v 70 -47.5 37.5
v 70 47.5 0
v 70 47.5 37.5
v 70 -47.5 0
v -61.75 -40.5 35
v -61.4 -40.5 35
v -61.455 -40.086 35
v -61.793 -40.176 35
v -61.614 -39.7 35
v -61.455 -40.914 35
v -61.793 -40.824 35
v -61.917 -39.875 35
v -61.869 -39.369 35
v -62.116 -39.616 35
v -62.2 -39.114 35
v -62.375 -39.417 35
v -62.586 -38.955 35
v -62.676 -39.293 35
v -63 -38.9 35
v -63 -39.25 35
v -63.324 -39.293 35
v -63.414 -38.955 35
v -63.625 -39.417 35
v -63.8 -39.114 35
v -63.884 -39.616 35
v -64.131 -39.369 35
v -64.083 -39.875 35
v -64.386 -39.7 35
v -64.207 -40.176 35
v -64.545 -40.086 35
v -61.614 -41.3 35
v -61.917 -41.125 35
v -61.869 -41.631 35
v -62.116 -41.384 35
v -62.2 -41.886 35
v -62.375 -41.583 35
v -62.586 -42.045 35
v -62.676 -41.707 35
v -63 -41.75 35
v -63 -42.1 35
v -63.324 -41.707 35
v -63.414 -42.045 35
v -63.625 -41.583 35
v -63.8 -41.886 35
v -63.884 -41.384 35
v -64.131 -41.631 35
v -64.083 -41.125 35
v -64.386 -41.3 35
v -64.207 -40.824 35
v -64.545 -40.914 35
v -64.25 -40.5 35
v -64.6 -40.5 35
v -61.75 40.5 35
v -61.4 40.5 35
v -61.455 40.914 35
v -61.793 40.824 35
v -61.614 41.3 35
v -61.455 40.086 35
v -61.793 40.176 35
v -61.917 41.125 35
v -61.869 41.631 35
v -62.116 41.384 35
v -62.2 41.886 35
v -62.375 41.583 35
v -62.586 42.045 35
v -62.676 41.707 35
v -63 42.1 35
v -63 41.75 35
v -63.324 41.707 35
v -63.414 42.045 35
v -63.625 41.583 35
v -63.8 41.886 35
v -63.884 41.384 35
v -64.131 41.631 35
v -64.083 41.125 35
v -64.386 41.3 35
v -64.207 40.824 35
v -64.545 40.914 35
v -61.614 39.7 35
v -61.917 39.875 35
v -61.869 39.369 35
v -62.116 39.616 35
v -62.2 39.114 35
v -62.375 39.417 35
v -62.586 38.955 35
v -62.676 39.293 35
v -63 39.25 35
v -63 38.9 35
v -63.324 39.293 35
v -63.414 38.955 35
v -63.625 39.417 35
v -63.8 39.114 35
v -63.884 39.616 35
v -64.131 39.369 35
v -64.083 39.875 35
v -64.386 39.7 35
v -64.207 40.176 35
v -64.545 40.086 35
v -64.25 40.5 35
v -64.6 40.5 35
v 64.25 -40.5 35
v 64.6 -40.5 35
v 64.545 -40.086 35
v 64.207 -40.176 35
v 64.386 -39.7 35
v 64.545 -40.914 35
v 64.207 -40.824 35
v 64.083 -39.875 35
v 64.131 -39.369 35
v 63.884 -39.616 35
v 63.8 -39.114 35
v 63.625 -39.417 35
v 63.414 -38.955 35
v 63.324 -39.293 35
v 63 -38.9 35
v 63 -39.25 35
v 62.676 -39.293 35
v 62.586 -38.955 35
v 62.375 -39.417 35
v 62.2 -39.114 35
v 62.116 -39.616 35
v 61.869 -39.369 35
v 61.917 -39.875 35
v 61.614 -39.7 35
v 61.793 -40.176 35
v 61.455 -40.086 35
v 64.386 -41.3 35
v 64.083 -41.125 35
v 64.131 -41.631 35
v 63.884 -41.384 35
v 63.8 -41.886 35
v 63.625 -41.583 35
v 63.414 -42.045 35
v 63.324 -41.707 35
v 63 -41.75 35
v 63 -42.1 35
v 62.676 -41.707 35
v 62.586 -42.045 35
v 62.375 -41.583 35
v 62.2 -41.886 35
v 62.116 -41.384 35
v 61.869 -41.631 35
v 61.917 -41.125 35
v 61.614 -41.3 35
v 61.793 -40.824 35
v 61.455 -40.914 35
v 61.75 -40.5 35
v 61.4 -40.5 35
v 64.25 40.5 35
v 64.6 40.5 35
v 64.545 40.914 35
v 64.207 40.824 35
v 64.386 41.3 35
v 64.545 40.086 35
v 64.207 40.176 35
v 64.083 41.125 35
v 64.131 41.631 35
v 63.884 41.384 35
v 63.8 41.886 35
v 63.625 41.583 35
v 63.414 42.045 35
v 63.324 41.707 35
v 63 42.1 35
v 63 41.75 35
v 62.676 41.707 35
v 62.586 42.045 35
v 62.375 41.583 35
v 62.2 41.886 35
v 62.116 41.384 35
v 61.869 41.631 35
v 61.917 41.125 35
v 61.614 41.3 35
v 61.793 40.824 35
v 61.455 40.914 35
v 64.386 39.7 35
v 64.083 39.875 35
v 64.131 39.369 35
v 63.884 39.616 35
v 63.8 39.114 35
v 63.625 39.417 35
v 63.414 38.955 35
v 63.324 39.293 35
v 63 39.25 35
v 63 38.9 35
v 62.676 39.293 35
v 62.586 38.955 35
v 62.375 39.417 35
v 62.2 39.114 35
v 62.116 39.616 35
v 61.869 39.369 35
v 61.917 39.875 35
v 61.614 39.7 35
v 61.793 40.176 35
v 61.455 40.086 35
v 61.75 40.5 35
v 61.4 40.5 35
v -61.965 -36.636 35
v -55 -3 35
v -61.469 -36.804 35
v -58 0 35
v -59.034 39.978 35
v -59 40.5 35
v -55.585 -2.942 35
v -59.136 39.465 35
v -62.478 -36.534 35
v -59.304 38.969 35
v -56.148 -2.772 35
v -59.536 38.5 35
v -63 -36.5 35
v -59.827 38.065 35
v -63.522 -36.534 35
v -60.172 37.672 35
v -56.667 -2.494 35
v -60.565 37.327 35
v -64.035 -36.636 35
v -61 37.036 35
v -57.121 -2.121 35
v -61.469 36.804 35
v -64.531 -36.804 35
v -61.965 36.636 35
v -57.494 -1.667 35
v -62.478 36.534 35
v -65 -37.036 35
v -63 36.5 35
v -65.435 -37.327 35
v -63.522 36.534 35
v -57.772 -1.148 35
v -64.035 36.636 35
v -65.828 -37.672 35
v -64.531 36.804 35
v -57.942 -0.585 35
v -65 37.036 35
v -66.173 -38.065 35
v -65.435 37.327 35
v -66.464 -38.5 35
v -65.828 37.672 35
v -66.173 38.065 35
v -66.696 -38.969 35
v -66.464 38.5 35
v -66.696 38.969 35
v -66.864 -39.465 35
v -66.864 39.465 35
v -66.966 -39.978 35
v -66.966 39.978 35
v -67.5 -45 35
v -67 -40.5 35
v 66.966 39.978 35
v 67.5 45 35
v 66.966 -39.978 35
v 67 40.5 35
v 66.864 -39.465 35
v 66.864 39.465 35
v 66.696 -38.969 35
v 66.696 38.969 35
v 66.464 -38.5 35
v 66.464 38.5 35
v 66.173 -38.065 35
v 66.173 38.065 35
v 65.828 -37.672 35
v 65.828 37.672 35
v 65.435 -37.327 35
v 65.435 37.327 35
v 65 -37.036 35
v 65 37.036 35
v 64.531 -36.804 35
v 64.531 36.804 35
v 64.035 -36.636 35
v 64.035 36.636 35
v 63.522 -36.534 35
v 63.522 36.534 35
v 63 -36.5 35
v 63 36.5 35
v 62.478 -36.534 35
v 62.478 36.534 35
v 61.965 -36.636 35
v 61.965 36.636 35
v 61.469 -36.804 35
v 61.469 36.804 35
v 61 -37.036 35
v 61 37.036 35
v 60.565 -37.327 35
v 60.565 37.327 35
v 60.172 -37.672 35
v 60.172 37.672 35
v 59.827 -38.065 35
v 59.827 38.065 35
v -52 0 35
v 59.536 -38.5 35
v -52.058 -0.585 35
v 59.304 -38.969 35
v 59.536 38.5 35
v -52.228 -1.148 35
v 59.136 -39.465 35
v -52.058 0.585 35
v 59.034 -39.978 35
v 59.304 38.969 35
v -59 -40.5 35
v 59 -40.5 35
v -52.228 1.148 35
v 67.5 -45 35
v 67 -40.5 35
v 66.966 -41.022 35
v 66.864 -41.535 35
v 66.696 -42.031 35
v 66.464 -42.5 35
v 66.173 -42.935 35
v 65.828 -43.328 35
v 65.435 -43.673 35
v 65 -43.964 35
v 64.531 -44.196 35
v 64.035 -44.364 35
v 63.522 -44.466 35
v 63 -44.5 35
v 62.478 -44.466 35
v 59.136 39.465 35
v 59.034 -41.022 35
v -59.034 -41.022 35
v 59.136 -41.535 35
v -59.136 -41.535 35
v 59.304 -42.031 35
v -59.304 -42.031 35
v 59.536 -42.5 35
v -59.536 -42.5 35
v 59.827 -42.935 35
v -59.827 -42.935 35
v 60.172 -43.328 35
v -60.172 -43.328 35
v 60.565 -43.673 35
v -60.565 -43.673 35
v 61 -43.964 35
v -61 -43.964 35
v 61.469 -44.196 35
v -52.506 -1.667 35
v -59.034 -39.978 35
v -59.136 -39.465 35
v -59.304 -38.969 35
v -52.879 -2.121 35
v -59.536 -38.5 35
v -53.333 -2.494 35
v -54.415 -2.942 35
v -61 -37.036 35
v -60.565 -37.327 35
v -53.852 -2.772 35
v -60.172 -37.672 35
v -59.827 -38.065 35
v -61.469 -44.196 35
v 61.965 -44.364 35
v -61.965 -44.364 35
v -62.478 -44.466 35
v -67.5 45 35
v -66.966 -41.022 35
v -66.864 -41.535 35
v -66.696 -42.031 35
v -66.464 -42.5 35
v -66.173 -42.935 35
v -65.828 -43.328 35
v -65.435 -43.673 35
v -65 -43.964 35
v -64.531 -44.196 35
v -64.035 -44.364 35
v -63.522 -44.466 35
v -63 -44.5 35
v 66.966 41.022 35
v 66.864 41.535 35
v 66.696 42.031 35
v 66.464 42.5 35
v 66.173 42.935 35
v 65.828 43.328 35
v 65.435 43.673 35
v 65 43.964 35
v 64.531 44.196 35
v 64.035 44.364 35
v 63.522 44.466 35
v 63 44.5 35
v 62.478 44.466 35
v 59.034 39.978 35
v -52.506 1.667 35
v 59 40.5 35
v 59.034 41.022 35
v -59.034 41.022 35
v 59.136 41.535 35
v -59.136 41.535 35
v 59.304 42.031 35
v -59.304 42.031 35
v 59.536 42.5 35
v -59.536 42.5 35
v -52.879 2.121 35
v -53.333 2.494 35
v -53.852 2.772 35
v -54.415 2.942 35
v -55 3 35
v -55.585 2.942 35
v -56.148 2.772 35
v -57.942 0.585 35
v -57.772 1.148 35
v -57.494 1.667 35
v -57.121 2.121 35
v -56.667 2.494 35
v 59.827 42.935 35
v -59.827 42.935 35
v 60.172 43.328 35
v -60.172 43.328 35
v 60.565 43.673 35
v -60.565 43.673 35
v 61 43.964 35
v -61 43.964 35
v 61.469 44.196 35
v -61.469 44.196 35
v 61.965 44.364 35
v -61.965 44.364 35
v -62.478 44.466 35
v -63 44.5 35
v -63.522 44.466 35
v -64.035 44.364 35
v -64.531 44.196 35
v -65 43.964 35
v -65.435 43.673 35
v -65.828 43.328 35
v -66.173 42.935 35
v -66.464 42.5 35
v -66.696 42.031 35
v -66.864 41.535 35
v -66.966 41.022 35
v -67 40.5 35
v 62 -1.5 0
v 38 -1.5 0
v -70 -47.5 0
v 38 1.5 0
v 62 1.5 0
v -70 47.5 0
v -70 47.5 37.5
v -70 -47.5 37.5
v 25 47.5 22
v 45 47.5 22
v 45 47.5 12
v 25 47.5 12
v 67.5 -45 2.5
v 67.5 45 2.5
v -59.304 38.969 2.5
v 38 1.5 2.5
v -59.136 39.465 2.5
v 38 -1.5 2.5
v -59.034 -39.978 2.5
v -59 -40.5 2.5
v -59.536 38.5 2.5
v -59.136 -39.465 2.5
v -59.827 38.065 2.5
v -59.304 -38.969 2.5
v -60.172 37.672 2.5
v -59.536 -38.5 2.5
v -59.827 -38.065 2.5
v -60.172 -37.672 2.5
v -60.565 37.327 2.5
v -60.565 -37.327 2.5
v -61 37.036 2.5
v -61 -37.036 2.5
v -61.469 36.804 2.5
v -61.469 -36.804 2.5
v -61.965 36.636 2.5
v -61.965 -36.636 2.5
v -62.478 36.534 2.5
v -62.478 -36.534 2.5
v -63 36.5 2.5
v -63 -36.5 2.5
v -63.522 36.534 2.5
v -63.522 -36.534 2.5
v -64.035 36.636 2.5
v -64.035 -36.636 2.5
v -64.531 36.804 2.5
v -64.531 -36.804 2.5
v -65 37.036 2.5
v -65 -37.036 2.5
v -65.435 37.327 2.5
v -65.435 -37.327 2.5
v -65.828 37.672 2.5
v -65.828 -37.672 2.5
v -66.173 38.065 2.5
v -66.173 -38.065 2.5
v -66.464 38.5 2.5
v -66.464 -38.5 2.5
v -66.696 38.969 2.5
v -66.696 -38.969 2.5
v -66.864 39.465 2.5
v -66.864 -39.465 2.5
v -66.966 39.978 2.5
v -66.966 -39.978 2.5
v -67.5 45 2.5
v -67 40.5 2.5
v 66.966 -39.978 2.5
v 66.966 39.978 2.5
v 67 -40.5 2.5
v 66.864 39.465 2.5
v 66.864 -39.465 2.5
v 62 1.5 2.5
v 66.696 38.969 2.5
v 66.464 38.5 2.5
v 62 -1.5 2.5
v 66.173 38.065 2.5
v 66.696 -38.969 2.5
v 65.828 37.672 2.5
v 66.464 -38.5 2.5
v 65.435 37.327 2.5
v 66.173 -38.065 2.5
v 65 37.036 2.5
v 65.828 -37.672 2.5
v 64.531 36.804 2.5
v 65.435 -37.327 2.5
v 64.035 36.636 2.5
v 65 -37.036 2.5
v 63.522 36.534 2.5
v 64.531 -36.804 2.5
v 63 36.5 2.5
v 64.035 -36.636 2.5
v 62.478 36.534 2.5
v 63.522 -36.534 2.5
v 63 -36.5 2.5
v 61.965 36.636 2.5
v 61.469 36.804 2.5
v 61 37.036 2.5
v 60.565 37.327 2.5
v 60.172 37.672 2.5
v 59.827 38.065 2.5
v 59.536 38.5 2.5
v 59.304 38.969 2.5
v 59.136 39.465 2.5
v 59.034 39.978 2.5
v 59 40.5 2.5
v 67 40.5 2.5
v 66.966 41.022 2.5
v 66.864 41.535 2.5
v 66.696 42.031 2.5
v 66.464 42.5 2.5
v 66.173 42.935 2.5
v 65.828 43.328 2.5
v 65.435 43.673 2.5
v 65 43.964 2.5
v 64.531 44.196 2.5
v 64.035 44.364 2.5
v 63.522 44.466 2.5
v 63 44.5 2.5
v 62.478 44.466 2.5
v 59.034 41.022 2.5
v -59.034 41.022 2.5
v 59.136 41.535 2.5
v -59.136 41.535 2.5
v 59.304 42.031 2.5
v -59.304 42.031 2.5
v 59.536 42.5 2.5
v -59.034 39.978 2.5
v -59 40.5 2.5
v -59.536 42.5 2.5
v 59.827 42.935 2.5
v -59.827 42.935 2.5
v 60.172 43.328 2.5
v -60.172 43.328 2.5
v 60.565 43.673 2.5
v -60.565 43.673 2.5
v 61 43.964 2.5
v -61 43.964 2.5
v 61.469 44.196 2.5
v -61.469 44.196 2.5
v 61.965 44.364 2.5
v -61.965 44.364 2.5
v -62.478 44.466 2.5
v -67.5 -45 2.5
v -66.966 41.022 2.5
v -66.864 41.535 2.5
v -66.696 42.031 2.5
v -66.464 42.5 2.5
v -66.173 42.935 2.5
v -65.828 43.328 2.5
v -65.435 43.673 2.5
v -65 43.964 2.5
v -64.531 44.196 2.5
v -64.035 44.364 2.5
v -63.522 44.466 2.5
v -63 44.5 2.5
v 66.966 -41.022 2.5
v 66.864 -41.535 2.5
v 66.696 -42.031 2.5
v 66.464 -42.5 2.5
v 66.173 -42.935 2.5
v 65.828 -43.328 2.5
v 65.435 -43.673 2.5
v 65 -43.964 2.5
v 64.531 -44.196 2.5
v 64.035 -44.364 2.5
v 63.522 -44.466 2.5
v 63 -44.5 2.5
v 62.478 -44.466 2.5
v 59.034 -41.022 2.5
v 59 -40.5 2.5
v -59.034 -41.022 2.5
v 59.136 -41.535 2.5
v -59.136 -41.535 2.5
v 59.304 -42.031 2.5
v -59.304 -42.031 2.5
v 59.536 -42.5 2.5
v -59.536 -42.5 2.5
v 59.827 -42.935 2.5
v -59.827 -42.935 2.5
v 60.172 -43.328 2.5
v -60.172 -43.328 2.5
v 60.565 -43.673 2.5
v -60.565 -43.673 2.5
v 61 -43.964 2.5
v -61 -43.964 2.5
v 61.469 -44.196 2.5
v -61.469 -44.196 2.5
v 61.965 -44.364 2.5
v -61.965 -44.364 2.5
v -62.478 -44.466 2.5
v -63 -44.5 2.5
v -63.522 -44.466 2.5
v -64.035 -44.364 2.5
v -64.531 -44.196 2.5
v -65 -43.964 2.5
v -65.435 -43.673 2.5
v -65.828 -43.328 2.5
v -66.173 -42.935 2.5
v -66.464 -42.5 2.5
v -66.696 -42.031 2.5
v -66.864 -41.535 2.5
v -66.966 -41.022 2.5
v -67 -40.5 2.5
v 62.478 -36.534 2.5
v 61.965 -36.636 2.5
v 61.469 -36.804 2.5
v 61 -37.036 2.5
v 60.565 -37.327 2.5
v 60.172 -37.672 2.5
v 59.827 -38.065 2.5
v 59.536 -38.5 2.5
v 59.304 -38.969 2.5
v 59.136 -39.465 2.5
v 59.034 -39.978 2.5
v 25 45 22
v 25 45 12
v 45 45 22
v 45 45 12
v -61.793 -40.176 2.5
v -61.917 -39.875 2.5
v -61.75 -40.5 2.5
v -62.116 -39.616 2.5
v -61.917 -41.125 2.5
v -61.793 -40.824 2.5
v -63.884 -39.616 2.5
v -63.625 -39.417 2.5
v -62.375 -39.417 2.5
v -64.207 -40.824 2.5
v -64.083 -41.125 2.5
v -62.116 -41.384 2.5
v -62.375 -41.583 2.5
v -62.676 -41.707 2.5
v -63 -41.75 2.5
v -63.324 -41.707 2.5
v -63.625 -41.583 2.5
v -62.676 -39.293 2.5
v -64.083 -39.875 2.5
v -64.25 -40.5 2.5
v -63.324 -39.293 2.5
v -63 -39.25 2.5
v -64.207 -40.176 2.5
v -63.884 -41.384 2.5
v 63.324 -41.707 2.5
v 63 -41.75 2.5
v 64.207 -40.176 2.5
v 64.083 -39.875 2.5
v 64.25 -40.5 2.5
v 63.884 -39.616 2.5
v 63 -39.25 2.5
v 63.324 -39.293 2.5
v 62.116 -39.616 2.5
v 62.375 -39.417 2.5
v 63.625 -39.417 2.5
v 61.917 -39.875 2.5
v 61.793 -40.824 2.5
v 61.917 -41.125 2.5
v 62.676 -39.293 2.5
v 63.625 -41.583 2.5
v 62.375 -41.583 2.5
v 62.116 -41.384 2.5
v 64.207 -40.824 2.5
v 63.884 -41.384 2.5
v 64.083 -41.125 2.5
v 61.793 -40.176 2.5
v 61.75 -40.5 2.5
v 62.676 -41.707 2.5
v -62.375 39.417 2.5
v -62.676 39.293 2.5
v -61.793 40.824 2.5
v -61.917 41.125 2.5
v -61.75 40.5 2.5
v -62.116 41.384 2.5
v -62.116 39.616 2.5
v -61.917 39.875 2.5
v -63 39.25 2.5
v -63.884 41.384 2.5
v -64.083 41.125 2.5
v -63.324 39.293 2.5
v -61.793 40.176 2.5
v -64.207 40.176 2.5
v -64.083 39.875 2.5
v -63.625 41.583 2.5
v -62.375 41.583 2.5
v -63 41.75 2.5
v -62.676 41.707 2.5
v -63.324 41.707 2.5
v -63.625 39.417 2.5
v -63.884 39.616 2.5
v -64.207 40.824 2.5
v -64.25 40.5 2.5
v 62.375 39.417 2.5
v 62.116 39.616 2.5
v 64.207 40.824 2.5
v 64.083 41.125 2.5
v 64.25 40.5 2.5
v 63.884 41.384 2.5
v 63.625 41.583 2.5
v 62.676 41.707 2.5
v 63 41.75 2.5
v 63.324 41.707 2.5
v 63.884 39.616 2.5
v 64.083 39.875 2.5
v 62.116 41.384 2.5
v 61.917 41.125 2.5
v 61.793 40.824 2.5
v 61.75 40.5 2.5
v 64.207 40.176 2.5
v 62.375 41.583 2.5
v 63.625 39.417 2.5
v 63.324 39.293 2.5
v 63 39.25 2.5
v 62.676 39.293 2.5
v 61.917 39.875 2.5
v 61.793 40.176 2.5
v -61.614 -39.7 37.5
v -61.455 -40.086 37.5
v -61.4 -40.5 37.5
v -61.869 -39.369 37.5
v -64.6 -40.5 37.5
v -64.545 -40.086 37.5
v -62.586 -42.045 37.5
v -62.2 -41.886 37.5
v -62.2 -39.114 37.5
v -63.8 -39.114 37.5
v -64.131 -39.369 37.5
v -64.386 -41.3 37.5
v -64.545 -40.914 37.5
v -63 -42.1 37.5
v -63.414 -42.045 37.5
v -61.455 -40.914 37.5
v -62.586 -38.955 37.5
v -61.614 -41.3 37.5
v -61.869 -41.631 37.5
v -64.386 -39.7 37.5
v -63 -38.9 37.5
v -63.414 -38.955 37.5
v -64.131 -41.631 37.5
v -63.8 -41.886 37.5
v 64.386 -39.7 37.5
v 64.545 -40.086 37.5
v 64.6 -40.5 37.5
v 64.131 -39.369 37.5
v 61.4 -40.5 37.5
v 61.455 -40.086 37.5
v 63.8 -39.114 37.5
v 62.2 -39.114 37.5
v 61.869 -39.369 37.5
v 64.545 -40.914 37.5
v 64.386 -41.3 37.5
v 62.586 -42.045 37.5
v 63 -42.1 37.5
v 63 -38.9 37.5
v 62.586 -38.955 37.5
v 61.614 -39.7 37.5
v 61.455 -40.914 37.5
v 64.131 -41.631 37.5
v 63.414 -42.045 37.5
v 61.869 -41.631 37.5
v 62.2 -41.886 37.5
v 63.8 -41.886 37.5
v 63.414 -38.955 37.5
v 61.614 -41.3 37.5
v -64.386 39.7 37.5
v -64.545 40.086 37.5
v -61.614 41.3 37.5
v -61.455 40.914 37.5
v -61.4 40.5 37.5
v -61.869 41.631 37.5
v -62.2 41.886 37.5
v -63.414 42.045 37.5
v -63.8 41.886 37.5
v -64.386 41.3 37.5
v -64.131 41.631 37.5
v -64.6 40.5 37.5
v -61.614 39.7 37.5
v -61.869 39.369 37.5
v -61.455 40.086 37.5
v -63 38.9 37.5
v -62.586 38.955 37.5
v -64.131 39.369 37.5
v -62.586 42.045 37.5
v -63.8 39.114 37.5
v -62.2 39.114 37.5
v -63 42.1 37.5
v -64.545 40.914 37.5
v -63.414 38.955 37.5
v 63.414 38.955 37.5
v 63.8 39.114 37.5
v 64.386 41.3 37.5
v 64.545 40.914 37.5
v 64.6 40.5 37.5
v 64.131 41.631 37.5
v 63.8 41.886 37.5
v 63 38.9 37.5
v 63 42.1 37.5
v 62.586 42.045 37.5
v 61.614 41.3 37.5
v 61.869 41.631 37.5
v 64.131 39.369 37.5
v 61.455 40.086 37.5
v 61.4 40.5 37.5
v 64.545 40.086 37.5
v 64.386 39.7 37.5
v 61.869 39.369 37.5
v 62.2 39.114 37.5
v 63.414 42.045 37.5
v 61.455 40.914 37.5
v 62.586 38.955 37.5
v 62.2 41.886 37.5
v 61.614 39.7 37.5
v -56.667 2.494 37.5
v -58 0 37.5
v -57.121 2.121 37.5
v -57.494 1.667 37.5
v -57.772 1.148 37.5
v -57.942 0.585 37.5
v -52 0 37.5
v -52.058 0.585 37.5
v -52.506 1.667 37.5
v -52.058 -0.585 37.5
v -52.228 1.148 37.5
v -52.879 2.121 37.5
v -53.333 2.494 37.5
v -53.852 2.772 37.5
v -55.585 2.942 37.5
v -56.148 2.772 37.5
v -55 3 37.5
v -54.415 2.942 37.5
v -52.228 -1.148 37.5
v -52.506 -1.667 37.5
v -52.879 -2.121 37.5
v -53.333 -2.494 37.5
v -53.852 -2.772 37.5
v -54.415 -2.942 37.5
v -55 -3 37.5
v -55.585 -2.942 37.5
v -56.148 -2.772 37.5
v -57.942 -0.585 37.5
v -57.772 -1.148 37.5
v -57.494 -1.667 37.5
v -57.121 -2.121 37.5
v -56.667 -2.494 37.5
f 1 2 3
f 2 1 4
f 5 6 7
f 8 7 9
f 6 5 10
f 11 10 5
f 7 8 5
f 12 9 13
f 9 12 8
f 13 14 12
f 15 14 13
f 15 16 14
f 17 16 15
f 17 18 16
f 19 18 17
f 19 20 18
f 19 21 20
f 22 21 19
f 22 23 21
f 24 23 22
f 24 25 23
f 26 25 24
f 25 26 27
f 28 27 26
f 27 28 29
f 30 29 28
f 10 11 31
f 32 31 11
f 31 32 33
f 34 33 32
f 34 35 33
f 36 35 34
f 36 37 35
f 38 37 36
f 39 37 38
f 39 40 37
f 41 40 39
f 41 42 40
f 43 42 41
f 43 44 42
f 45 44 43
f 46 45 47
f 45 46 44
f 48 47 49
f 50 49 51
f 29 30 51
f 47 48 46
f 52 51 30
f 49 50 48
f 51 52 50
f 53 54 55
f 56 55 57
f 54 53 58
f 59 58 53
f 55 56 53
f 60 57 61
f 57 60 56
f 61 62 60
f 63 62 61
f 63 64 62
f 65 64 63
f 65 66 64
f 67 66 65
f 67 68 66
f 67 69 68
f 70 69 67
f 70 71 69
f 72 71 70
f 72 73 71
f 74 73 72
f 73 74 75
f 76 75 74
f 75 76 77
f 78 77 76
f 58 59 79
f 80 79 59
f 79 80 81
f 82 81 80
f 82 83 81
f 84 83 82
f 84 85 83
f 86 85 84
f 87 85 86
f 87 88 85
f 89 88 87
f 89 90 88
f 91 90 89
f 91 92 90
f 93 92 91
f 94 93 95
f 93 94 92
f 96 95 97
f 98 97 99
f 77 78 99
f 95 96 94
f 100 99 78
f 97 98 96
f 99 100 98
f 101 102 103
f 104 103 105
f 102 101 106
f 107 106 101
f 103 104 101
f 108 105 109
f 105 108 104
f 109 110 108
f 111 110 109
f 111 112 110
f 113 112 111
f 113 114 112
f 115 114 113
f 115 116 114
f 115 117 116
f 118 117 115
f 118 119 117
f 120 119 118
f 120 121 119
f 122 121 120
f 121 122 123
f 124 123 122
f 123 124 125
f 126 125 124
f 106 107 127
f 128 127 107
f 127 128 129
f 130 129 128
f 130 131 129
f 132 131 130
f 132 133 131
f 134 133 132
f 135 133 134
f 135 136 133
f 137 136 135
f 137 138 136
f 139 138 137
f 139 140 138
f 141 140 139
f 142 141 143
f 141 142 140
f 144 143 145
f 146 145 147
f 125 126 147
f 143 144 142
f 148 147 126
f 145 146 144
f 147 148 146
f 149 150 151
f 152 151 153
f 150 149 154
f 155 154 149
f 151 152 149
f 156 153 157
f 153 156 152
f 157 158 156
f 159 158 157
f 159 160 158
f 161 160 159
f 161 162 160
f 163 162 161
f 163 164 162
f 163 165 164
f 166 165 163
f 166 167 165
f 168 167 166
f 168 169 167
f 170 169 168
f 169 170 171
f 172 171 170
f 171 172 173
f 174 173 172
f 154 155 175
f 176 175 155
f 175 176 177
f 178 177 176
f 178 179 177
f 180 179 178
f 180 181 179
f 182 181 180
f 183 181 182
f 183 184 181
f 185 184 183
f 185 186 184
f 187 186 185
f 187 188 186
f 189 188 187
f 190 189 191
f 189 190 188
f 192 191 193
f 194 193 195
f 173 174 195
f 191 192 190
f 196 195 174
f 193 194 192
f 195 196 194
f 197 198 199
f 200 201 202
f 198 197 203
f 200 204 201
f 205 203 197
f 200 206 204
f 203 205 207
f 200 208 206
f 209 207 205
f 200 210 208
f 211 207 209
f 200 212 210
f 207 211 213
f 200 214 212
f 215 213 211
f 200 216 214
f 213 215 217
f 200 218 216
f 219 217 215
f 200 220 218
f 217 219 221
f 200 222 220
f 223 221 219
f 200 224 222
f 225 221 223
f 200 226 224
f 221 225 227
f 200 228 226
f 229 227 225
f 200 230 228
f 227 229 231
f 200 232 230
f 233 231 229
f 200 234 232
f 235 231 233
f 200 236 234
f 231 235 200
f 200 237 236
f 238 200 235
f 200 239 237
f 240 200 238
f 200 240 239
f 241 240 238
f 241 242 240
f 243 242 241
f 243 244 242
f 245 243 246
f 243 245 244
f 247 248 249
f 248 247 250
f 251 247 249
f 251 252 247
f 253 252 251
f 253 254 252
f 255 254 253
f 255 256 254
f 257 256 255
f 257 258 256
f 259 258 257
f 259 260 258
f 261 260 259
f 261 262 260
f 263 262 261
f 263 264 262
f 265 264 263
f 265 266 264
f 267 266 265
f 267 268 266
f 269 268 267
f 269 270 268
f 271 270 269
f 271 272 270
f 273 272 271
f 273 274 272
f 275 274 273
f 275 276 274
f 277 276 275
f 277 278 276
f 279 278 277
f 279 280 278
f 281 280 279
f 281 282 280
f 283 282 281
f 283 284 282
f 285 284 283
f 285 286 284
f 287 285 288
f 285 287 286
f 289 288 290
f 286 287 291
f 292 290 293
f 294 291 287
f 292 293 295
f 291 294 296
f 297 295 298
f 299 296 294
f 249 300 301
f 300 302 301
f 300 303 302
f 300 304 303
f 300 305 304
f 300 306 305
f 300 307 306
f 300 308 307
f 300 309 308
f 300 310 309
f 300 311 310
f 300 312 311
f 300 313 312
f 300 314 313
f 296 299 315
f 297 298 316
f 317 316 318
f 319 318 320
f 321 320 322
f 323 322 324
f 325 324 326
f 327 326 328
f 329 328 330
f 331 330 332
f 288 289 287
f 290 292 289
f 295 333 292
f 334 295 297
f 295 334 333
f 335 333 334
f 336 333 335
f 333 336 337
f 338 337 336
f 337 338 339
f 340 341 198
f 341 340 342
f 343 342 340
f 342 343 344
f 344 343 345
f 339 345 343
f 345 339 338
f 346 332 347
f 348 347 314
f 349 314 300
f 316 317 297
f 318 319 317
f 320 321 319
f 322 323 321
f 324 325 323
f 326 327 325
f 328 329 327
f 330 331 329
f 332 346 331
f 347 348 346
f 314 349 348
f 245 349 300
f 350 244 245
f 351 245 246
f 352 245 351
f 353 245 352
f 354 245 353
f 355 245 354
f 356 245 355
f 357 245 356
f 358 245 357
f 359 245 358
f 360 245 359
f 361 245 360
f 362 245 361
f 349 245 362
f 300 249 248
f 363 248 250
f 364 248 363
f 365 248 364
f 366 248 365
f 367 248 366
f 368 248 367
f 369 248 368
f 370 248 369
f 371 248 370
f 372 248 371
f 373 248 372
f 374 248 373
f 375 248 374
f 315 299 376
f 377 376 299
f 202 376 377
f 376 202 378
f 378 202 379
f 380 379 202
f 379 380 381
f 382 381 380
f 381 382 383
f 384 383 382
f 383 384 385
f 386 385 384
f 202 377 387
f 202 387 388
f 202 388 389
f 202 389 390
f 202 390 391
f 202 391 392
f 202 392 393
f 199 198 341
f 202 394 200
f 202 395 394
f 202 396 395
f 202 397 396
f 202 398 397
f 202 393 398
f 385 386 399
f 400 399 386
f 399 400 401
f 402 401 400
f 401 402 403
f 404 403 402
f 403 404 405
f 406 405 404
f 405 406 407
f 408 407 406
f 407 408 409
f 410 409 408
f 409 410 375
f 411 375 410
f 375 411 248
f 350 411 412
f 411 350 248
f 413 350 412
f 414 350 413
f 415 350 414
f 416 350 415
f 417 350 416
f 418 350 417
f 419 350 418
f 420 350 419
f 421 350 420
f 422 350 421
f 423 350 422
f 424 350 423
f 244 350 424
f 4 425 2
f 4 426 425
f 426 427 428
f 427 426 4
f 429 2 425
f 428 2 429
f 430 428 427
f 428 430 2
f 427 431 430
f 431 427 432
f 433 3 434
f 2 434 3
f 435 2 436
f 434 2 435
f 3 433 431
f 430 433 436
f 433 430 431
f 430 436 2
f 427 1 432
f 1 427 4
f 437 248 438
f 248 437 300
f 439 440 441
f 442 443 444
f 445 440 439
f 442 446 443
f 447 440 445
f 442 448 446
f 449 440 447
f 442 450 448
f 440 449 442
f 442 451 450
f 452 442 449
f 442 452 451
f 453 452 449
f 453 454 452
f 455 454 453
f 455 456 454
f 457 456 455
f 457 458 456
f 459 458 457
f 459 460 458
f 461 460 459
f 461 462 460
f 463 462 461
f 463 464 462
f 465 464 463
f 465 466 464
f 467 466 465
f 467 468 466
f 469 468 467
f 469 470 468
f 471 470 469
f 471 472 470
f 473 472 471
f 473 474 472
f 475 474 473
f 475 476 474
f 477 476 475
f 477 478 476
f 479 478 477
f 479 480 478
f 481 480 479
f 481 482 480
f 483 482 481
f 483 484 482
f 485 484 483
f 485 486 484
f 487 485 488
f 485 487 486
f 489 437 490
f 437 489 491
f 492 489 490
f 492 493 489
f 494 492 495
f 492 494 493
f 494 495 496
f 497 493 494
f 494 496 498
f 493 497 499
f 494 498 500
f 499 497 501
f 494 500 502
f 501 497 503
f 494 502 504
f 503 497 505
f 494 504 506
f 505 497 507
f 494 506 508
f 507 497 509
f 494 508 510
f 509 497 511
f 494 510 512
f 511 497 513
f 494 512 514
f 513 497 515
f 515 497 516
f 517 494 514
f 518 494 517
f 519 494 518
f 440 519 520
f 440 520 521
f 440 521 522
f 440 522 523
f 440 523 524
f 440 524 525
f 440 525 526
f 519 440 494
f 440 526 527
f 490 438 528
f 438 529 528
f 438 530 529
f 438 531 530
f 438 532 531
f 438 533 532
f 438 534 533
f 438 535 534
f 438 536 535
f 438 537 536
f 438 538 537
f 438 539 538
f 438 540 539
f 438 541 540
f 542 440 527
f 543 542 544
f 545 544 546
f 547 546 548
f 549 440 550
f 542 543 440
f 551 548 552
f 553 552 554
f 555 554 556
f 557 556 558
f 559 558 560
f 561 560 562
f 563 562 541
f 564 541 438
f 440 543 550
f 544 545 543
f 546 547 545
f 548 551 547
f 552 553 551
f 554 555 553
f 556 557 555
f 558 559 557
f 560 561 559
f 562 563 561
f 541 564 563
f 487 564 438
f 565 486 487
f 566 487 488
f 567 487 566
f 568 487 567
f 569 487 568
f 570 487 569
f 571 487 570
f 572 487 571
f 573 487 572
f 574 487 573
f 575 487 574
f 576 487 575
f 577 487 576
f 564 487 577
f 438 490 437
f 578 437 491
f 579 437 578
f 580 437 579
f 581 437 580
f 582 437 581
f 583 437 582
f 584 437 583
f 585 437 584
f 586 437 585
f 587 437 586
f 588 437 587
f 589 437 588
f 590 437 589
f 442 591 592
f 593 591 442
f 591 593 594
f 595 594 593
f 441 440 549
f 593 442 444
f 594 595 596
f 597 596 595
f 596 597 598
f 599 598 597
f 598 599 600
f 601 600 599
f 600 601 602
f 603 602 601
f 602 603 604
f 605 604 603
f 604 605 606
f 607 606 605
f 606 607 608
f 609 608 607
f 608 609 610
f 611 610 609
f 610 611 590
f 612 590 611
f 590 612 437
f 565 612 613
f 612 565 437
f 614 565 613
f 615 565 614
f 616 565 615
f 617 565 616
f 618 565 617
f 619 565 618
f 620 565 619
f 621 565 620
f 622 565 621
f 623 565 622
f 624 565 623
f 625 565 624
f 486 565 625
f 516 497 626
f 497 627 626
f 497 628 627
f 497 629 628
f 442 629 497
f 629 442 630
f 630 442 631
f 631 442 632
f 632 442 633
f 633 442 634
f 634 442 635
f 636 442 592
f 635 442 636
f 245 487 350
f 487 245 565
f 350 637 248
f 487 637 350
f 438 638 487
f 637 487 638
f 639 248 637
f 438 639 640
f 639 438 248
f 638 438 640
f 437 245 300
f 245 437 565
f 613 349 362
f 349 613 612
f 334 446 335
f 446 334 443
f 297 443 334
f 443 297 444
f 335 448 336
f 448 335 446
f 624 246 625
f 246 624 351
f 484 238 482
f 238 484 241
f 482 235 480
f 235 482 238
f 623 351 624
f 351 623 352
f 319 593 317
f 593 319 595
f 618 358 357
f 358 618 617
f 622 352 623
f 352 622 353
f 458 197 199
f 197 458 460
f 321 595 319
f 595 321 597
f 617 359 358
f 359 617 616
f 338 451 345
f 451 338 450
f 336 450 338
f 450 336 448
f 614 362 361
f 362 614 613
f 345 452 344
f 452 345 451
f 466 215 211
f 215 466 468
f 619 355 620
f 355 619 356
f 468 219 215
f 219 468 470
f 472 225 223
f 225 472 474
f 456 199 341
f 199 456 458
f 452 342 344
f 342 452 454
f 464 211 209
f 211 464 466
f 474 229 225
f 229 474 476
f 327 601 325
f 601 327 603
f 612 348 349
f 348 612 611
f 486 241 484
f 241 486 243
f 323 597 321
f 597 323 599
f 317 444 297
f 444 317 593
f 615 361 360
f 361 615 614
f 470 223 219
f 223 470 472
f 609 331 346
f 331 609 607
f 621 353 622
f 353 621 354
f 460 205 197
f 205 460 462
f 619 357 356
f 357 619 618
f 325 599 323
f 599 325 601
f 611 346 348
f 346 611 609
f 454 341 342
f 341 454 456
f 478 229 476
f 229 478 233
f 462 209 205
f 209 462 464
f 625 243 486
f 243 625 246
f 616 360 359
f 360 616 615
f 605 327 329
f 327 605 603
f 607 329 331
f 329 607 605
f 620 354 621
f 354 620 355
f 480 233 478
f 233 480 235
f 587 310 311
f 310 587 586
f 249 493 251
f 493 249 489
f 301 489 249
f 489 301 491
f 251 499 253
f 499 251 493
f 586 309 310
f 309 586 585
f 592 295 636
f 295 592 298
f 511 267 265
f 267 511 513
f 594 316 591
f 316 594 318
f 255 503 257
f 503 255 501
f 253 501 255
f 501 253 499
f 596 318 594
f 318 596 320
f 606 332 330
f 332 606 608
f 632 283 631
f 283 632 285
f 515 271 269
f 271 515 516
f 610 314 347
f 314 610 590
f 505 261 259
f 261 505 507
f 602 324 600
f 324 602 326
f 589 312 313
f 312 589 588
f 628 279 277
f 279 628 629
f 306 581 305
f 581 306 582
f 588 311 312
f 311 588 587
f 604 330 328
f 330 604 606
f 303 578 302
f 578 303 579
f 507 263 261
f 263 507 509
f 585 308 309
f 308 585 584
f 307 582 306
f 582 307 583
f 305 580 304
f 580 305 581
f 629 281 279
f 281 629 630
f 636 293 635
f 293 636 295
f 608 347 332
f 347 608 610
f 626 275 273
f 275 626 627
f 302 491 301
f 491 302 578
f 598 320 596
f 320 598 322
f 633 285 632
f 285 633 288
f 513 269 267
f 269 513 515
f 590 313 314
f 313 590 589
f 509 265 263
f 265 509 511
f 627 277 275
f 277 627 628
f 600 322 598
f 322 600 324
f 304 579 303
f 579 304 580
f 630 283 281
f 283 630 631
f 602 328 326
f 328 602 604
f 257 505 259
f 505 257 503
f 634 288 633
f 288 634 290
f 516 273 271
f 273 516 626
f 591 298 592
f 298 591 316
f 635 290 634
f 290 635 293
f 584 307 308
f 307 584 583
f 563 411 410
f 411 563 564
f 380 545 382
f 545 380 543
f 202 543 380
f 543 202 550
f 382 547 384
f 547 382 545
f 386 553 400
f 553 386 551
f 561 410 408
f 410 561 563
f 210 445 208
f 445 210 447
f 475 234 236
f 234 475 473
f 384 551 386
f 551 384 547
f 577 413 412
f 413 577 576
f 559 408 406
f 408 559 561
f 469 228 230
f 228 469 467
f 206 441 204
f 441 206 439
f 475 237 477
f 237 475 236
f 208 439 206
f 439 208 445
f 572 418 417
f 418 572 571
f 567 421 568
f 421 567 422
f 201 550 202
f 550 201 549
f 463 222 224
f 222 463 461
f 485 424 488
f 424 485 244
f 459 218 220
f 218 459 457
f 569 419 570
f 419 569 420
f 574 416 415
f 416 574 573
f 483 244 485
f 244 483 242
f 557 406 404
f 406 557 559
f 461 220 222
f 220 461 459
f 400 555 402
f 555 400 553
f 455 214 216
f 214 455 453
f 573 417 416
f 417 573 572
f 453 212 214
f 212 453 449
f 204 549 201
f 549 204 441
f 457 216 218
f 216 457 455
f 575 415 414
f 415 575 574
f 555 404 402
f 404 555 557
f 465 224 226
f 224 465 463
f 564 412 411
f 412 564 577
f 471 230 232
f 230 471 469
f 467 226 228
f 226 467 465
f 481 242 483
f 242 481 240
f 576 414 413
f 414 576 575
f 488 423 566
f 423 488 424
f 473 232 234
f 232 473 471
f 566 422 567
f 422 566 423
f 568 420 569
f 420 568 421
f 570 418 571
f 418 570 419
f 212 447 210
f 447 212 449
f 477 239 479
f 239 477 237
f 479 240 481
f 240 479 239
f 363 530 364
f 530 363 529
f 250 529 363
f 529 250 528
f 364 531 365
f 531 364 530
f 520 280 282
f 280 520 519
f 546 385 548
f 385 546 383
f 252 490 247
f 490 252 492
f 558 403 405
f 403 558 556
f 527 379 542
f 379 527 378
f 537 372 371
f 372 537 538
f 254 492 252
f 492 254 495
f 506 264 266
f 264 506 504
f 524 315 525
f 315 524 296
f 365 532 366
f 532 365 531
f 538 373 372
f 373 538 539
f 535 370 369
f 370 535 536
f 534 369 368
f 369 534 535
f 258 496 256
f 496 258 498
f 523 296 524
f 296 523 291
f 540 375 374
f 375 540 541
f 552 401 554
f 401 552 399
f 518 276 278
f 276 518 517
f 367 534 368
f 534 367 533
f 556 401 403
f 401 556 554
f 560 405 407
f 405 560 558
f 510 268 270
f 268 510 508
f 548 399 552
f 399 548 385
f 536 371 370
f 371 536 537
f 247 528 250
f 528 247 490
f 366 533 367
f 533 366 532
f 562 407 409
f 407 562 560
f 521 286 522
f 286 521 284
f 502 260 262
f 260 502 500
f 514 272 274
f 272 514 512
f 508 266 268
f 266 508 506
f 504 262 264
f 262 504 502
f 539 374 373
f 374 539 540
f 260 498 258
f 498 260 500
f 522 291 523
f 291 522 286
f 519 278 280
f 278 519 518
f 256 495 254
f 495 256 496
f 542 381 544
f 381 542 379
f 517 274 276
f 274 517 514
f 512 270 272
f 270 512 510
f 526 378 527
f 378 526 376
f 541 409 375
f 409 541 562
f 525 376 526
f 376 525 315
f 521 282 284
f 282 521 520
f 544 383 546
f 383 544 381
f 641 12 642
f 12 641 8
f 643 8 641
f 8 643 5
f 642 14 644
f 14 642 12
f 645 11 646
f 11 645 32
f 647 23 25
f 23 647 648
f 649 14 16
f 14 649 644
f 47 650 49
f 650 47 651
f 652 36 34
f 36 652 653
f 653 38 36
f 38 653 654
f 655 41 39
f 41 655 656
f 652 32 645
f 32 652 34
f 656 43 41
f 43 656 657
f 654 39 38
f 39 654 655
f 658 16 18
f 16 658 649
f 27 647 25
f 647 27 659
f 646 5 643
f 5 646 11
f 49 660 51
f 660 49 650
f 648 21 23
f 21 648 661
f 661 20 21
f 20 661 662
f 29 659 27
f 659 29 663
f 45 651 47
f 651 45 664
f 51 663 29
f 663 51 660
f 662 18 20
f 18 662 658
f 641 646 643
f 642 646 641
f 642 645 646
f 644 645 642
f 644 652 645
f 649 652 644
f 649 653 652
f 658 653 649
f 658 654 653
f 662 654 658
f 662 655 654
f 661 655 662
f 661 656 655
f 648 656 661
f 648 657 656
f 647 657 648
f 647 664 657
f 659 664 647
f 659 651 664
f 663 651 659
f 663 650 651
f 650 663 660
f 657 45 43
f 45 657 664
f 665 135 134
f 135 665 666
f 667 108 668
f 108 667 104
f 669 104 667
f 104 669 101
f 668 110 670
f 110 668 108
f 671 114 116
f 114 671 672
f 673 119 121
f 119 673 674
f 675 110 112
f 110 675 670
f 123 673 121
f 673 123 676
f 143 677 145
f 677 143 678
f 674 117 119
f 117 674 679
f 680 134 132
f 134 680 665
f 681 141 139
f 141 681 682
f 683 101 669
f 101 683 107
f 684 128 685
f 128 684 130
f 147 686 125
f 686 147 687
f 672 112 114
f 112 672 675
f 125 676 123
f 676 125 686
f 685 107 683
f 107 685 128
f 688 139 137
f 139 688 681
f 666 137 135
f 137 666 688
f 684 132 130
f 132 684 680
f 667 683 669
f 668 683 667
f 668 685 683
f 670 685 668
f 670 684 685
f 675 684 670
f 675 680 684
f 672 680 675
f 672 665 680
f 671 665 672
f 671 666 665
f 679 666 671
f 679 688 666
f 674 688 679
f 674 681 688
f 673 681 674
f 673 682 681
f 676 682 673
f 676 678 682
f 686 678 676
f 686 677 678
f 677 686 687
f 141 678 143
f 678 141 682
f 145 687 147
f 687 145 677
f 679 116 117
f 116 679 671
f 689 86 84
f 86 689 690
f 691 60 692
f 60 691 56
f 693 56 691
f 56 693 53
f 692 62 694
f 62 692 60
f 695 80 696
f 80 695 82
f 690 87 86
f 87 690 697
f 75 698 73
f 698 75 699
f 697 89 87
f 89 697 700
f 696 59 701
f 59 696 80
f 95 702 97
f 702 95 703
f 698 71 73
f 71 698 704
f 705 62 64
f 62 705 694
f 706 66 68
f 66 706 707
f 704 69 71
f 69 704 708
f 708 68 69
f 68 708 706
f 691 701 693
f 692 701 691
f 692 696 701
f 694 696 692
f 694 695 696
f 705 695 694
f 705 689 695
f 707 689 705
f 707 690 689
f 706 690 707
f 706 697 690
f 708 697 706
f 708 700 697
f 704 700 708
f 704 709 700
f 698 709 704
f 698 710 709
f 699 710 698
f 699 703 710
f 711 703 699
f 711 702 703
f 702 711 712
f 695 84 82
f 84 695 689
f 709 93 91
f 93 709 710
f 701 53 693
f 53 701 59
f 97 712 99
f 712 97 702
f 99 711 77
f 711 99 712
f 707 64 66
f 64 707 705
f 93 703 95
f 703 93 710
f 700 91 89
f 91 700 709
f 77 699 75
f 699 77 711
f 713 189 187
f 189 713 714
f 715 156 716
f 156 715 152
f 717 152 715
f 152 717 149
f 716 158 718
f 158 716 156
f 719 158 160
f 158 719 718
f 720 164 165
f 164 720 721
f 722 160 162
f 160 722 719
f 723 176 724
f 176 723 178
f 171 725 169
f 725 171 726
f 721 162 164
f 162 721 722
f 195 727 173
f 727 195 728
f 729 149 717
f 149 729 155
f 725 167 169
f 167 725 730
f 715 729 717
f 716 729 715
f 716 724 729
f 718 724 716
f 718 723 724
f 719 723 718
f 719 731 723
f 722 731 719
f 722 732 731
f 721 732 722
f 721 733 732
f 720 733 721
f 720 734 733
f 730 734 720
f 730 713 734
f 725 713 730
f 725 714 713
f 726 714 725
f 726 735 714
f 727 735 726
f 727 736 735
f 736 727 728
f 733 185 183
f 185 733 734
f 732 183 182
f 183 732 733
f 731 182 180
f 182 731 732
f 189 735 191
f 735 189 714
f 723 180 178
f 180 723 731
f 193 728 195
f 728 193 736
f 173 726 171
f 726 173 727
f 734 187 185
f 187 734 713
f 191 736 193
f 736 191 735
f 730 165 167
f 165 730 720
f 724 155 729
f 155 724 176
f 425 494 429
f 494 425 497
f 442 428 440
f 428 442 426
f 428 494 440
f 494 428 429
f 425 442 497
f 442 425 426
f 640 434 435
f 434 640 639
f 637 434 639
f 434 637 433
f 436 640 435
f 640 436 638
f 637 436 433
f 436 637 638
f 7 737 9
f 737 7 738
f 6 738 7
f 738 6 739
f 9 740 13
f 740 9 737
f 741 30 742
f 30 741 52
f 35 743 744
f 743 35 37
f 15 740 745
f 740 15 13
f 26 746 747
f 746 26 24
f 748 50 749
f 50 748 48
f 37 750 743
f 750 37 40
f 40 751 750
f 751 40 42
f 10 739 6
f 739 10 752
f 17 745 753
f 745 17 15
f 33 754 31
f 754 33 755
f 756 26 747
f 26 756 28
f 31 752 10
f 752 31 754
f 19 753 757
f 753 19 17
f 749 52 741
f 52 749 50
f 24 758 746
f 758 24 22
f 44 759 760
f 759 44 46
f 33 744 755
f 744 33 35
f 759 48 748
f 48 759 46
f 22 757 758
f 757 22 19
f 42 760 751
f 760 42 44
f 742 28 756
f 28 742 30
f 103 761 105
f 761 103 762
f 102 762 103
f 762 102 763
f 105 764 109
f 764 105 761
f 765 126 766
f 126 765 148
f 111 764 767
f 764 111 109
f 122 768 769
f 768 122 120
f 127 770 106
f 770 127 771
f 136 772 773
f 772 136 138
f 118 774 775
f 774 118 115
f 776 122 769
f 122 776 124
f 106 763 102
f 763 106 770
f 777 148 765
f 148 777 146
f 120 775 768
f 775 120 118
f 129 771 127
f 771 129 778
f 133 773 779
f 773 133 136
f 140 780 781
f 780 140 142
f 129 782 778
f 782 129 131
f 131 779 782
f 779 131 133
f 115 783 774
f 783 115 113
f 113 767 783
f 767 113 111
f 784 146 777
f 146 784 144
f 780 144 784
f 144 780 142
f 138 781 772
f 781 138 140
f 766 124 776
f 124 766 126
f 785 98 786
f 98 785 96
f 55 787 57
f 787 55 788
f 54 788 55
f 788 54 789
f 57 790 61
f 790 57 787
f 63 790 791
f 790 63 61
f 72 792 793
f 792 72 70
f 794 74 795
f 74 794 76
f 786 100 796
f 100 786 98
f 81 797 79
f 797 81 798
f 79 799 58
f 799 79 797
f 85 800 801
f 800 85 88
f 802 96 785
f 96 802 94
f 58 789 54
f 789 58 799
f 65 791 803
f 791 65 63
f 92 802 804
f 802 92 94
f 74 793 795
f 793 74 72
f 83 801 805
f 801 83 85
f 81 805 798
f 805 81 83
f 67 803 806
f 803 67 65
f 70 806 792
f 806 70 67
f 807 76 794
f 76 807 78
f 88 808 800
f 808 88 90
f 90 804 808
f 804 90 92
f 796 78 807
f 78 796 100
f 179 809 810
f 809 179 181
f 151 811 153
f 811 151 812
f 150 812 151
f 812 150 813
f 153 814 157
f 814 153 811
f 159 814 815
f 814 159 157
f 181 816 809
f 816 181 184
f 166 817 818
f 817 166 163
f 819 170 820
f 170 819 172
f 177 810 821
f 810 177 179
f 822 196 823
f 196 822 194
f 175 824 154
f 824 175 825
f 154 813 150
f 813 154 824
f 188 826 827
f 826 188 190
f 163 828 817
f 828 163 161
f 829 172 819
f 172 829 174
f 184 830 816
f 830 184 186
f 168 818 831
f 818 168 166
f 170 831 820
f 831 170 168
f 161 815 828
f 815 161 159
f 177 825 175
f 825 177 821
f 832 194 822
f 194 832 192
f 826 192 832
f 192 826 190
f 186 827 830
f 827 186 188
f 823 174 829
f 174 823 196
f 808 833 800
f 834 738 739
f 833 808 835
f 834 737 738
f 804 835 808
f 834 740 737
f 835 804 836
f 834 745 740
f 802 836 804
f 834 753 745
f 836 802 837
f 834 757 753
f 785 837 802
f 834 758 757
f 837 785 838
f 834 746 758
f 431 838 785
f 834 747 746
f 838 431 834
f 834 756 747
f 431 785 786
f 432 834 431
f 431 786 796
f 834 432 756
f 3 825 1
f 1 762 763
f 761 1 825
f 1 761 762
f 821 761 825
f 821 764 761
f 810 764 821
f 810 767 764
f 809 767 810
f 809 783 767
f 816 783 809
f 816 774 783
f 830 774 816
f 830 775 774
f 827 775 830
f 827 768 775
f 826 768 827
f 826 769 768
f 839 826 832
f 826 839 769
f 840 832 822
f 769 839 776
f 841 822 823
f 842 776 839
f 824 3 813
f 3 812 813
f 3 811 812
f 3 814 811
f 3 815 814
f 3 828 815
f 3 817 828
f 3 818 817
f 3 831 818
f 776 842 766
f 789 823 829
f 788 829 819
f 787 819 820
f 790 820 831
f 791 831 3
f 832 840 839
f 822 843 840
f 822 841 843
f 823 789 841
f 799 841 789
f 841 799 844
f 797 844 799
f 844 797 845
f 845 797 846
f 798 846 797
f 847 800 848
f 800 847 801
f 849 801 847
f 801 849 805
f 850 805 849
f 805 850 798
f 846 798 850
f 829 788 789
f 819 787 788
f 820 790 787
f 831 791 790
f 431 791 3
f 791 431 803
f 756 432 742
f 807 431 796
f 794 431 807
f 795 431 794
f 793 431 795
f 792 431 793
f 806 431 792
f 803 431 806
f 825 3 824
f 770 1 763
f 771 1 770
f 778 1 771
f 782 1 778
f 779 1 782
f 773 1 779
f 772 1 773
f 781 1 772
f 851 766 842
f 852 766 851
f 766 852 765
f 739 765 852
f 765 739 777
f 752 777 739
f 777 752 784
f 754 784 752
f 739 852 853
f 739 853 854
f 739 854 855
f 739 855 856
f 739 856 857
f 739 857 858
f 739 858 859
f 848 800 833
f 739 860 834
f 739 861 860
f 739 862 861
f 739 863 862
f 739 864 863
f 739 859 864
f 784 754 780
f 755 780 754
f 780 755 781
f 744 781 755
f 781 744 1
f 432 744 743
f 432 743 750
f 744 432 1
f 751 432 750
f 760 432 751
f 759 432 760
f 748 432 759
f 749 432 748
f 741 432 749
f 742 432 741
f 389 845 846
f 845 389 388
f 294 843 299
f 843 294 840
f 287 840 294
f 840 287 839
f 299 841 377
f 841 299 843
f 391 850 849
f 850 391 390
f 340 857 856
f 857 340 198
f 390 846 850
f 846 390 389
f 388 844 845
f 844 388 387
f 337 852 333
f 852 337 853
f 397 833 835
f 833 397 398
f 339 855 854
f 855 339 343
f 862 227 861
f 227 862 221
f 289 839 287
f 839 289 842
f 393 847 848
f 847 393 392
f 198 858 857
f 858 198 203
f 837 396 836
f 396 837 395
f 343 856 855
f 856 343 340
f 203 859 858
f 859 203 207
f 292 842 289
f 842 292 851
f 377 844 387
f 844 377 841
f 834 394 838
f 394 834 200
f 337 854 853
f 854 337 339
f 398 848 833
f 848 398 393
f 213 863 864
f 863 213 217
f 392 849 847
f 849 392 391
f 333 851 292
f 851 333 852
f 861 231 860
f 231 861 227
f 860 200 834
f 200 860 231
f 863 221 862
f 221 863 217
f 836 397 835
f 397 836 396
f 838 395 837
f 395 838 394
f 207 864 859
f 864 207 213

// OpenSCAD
// Soil sensor node enclosure: the printed base and lid of Workshop's
// starter assembly (src/lib/sensor-node.ts), written out in OpenSCAD so the
// workspace build can slice and simulate it. Same sizes as the CAD plans there;
// change both together. All sizes in mm; origin at the centre of the floor.
//
//   openscad -D 'part="base"' -o base.stl enclosure.scad   (also lid; closed = base and lid together)

part = "closed"; // base | lid | lid-print | closed
W = 140; D = 95; H = 35; T = 2.5;
corners = [[-63, -40.5], [63, -40.5], [-63, 40.5], [63, 40.5]];

module base() difference() {
  union() {
    difference() {
      translate([-W / 2, -D / 2, 0]) cube([W, D, H]);
      translate([-W / 2 + T, -D / 2 + T, T]) cube([W - 2 * T, D - 2 * T, H]);
    }
    for (c = corners) translate([c[0], c[1], T]) cylinder(r = 4, h = H - T, $fn = 48);
  }
  // Probe slot through the floor and an air vent beside the CO2 sensor.
  translate([38, -1.5, -1]) cube([24, 3, T + 2]);
  translate([25, D / 2 - T - 1, 12]) cube([20, T + 2, 10]);
  for (c = corners) translate([c[0], c[1], T]) cylinder(r = 1.25, h = H, $fn = 24);
}

// The lid as assembled, on top of the base; a window over the lux sensor.
module lid() translate([0, 0, H]) difference() {
  translate([-W / 2, -D / 2, 0]) cube([W, D, T]);
  translate([-55, 0, -1]) cylinder(r = 3, h = T + 2, $fn = 32);
  for (c = corners) translate([c[0], c[1], -1]) cylinder(r = 1.6, h = T + 2, $fn = 24);
}

if (part == "base") base();
else if (part == "lid") lid();
else { base(); lid(); }
